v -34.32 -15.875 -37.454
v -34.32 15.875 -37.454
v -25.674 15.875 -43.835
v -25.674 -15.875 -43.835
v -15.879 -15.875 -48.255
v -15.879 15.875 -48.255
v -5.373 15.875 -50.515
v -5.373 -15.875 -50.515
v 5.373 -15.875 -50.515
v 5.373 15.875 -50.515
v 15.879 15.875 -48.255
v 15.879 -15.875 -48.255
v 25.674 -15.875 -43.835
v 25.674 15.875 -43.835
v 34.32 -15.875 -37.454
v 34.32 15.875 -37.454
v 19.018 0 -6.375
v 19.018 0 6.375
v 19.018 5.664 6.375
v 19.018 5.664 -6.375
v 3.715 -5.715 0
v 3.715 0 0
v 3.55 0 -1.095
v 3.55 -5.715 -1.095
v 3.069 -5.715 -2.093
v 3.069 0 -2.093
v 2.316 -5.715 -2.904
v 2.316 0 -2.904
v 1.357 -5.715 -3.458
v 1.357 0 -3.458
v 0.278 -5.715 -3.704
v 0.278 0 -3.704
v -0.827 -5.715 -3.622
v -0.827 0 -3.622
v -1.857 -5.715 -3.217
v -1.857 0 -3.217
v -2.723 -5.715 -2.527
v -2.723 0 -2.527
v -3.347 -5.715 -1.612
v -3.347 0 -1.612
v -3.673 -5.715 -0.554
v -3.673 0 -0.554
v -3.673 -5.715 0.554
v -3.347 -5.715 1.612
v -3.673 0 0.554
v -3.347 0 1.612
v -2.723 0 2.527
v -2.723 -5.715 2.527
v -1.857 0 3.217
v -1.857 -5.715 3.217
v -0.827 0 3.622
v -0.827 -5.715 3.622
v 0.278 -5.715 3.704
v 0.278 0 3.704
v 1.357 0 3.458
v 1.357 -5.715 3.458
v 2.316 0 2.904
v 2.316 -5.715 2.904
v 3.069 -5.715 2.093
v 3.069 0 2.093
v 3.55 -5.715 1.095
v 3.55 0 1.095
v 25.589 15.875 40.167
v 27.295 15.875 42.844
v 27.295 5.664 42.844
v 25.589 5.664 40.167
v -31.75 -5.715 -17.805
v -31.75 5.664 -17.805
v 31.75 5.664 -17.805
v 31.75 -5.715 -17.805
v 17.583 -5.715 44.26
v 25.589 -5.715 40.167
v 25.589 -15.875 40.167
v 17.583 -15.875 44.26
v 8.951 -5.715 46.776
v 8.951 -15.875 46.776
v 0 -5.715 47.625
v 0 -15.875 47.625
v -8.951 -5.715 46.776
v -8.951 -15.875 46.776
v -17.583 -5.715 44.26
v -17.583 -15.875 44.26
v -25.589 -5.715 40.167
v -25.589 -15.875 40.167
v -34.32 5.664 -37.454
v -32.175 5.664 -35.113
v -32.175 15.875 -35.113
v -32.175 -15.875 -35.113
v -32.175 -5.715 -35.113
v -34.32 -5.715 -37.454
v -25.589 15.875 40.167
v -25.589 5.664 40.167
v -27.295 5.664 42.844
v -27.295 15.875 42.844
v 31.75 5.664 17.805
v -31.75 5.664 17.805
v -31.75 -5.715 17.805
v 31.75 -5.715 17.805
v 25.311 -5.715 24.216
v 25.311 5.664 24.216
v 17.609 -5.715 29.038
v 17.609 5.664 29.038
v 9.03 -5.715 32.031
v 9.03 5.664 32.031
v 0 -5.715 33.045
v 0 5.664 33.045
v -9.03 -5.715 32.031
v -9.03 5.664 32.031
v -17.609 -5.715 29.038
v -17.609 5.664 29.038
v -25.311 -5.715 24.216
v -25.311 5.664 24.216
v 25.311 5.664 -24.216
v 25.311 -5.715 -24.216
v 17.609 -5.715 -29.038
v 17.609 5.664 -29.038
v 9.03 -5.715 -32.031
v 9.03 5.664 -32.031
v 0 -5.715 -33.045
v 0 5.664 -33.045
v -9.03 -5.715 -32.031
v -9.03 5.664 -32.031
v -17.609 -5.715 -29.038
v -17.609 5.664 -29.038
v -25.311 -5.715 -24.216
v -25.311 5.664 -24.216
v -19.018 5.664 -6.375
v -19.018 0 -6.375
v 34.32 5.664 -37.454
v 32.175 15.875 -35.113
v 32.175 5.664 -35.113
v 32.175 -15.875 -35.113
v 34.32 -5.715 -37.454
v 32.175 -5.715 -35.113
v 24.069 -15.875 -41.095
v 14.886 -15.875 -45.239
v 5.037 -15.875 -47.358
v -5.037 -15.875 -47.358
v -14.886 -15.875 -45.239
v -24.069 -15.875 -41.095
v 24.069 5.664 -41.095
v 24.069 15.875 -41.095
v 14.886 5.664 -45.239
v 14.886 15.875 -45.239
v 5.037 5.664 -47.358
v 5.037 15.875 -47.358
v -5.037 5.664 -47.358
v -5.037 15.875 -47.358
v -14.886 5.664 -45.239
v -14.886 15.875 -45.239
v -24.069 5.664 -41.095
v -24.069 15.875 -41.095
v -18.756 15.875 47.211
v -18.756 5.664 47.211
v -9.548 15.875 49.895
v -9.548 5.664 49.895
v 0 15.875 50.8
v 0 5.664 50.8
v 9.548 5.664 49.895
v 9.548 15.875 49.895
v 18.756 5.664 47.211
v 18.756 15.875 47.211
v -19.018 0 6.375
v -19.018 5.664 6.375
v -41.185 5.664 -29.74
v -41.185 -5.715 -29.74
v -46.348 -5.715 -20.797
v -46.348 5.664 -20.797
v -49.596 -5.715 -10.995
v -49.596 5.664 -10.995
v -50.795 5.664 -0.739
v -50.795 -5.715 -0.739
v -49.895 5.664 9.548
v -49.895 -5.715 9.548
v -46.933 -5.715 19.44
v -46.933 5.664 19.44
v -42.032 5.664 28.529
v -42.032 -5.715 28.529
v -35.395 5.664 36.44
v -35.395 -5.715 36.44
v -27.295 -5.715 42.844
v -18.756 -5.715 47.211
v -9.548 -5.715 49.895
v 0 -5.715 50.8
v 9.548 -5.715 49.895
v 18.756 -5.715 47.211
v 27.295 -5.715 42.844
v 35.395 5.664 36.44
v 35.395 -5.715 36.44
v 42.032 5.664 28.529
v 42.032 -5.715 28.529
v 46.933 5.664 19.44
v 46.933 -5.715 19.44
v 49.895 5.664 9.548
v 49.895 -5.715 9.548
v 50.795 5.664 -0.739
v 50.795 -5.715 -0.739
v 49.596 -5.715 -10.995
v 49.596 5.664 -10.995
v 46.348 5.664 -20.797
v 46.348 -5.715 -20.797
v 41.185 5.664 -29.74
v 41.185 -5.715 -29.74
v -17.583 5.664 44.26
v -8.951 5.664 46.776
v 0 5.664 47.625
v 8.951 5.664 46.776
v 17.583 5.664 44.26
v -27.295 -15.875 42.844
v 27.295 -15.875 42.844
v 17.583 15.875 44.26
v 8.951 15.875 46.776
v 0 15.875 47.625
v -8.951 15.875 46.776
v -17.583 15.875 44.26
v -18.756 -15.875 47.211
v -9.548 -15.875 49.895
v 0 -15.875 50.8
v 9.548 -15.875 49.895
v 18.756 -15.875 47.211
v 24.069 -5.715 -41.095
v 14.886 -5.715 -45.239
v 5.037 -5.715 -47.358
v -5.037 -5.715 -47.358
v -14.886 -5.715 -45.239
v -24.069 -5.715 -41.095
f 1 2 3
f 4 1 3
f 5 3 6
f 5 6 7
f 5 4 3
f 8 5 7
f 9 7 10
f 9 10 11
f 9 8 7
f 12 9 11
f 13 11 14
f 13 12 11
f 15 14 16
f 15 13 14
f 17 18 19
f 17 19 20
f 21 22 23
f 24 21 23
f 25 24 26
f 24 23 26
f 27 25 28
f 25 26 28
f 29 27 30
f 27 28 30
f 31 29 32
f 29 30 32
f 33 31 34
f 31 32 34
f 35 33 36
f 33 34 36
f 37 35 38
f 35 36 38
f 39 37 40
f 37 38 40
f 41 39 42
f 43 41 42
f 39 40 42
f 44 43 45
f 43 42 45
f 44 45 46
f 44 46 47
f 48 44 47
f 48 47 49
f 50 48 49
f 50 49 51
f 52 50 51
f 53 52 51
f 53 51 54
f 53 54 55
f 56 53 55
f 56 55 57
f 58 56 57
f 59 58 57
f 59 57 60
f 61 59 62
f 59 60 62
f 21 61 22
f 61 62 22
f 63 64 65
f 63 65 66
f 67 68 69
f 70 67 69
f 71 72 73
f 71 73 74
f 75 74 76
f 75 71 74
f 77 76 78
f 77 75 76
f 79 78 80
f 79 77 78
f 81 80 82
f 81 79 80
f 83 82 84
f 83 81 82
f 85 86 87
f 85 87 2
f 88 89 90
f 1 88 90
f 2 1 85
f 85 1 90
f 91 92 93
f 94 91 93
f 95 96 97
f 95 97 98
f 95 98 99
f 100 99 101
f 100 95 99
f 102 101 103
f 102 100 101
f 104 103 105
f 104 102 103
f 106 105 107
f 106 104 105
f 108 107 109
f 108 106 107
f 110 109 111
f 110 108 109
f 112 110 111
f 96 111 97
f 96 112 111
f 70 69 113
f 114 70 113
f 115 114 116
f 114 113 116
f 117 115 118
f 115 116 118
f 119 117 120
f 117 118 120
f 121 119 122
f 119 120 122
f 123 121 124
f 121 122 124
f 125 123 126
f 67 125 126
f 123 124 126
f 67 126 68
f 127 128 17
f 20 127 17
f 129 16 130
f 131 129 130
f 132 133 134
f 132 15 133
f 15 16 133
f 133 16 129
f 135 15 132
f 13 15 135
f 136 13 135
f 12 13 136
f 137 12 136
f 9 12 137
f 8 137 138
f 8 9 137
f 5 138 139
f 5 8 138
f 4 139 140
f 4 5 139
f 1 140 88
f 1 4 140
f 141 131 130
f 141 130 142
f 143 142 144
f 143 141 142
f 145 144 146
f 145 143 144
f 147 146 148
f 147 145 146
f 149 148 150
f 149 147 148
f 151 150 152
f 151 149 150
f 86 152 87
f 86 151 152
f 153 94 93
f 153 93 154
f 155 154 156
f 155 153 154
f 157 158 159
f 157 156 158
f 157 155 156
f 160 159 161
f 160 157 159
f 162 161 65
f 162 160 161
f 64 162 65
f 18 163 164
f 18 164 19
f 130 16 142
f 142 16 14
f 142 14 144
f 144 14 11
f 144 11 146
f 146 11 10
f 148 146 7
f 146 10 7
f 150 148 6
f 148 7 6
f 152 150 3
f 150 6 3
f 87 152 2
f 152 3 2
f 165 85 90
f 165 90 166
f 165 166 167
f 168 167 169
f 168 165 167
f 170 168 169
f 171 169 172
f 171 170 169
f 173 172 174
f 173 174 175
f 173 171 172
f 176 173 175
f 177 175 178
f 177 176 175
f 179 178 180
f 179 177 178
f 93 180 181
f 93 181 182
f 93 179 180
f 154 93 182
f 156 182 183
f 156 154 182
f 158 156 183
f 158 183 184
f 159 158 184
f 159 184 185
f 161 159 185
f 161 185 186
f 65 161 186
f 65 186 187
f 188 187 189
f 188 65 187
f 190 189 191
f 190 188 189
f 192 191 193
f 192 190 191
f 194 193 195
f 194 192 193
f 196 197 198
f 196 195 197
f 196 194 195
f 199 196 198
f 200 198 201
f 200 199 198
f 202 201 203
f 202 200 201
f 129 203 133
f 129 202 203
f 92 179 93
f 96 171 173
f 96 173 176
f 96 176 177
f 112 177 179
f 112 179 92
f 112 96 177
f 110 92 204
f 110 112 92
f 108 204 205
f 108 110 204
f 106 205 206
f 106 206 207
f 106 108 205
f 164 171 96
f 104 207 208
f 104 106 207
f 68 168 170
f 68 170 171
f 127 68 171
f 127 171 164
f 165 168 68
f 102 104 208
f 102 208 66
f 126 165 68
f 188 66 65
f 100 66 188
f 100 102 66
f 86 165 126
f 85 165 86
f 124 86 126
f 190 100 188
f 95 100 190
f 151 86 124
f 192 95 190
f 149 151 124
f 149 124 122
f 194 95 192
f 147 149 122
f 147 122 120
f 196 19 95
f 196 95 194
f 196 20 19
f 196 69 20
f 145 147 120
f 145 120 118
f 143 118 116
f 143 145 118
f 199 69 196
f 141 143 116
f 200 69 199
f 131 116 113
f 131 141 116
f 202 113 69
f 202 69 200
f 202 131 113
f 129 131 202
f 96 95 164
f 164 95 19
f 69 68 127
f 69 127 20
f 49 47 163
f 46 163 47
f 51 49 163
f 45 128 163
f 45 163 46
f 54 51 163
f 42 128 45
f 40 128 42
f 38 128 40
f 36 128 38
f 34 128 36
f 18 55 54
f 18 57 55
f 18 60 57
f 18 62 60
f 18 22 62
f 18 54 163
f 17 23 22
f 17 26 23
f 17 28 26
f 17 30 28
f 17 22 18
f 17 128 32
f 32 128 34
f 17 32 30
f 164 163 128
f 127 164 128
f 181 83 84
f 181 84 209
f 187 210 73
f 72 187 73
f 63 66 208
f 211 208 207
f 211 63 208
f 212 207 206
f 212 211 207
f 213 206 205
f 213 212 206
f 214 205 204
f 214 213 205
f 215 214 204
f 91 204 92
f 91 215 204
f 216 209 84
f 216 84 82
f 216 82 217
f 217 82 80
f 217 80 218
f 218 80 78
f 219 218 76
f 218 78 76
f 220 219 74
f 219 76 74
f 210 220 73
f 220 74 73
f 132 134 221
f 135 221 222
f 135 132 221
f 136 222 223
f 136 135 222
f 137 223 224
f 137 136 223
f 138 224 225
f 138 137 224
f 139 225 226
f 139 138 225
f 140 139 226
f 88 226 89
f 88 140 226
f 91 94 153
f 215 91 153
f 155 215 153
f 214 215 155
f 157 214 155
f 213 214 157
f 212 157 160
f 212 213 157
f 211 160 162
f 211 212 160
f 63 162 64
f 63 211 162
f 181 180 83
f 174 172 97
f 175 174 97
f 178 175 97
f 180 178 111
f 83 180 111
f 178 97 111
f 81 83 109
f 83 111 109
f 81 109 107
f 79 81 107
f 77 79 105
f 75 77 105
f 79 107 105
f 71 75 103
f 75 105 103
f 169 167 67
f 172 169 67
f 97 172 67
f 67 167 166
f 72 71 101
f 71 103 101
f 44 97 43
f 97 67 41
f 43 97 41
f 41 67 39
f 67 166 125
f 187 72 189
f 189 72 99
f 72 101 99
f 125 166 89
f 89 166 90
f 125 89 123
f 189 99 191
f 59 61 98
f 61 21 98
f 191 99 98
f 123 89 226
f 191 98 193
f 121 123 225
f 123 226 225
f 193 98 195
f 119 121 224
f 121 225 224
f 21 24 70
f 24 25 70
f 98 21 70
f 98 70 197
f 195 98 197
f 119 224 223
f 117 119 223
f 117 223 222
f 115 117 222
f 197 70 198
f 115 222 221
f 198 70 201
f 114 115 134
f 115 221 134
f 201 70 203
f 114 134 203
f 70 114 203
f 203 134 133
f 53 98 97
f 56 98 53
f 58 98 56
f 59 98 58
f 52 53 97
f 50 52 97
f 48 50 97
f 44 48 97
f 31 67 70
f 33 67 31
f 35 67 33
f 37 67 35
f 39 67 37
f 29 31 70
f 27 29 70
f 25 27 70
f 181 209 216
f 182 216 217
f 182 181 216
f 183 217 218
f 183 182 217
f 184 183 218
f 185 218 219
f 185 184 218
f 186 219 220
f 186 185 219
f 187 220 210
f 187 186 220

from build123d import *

# Parameters (mm, degrees)
SKETCH1_R           = 50.8
SKETCH1_W           = 38.0365
SKETCH1_H           = 12.7508
BOSS_EXTRUDE1_DEPTH = 5.6642
BOSS_EXTRUDE2_START = -5.715
SKETCH1_3_R         = 50.8
SKETCH1_3_R_2       = 3.71475
BOSS_EXTRUDE2_DEPTH = 5.715
BOSS_EXTRUDE3_DEPTH = 15.875
CUT_EXTRUDE1_DEPTH  = 76.001448


with BuildPart() as part:
    # Sketch1 → Boss-Extrude1 (new body)
    with BuildSketch(Plane(origin=(0, 0, 0), x_dir=(1, 0, 0), z_dir=(0, 1, 0))):
        Circle(SKETCH1_R)
        Rectangle(SKETCH1_W, SKETCH1_H, mode=Mode.SUBTRACT)
    extrude(amount=BOSS_EXTRUDE1_DEPTH)

    # Sketch1<3> → Boss-Extrude2 (add)
    with BuildSketch(Plane(origin=(0, 0, 0), x_dir=(1, 0, 0), z_dir=(0, 1, 0)).offset(BOSS_EXTRUDE2_START)):
        Circle(SKETCH1_3_R)
        Circle(SKETCH1_3_R_2, mode=Mode.SUBTRACT)
    extrude(amount=BOSS_EXTRUDE2_DEPTH)

    # Sketch2 → Boss-Extrude3 (add, symmetric)
    with BuildSketch(Plane(origin=(0, 0, 0), x_dir=(1, 0, 0), z_dir=(0, 1, 0))):
        with BuildLine():
            Line((-32.174984, 35.112833), (-34.319983, 37.453689))
            ThreePointArc((-34.319983, 37.453689), (0, 50.8), (34.319983, 37.453689))
            Line((34.319983, 37.453689), (32.174984, 35.112833))
            ThreePointArc((32.174984, 35.112833), (0, 47.625), (-32.174984, 35.112833))
        make_face()
        with BuildLine():
            Line((-25.588894, -40.166518), (-27.29482, -42.844285))
            ThreePointArc((-27.29482, -42.844285), (0, -50.8), (27.29482, -42.844285))
            Line((27.29482, -42.844285), (25.588894, -40.166518))
            ThreePointArc((25.588894, -40.166518), (0, -47.625), (-25.588894, -40.166518))
        make_face()
    extrude(amount=BOSS_EXTRUDE3_DEPTH, both=True)

    # Sketch3 → Cut-Extrude1 (cut, through all)
    with BuildSketch(Plane(origin=(0, 5.6642, 0), x_dir=(1, 0, 0), z_dir=(0, 1, 0))):
        with BuildLine():
            Line((-31.75, 17.8054), (31.75, 17.8054))
            ThreePointArc((31.75, 17.8054), (0, 33.0454), (-31.75, 17.8054))
        make_face()
        with BuildLine():
            Line((-31.75, -17.8054), (31.75, -17.8054))
            ThreePointArc((31.75, -17.8054), (0, -33.0454), (-31.75, -17.8054))
        make_face()
    extrude(amount=-CUT_EXTRUDE1_DEPTH, mode=Mode.SUBTRACT)


solid = part.part
